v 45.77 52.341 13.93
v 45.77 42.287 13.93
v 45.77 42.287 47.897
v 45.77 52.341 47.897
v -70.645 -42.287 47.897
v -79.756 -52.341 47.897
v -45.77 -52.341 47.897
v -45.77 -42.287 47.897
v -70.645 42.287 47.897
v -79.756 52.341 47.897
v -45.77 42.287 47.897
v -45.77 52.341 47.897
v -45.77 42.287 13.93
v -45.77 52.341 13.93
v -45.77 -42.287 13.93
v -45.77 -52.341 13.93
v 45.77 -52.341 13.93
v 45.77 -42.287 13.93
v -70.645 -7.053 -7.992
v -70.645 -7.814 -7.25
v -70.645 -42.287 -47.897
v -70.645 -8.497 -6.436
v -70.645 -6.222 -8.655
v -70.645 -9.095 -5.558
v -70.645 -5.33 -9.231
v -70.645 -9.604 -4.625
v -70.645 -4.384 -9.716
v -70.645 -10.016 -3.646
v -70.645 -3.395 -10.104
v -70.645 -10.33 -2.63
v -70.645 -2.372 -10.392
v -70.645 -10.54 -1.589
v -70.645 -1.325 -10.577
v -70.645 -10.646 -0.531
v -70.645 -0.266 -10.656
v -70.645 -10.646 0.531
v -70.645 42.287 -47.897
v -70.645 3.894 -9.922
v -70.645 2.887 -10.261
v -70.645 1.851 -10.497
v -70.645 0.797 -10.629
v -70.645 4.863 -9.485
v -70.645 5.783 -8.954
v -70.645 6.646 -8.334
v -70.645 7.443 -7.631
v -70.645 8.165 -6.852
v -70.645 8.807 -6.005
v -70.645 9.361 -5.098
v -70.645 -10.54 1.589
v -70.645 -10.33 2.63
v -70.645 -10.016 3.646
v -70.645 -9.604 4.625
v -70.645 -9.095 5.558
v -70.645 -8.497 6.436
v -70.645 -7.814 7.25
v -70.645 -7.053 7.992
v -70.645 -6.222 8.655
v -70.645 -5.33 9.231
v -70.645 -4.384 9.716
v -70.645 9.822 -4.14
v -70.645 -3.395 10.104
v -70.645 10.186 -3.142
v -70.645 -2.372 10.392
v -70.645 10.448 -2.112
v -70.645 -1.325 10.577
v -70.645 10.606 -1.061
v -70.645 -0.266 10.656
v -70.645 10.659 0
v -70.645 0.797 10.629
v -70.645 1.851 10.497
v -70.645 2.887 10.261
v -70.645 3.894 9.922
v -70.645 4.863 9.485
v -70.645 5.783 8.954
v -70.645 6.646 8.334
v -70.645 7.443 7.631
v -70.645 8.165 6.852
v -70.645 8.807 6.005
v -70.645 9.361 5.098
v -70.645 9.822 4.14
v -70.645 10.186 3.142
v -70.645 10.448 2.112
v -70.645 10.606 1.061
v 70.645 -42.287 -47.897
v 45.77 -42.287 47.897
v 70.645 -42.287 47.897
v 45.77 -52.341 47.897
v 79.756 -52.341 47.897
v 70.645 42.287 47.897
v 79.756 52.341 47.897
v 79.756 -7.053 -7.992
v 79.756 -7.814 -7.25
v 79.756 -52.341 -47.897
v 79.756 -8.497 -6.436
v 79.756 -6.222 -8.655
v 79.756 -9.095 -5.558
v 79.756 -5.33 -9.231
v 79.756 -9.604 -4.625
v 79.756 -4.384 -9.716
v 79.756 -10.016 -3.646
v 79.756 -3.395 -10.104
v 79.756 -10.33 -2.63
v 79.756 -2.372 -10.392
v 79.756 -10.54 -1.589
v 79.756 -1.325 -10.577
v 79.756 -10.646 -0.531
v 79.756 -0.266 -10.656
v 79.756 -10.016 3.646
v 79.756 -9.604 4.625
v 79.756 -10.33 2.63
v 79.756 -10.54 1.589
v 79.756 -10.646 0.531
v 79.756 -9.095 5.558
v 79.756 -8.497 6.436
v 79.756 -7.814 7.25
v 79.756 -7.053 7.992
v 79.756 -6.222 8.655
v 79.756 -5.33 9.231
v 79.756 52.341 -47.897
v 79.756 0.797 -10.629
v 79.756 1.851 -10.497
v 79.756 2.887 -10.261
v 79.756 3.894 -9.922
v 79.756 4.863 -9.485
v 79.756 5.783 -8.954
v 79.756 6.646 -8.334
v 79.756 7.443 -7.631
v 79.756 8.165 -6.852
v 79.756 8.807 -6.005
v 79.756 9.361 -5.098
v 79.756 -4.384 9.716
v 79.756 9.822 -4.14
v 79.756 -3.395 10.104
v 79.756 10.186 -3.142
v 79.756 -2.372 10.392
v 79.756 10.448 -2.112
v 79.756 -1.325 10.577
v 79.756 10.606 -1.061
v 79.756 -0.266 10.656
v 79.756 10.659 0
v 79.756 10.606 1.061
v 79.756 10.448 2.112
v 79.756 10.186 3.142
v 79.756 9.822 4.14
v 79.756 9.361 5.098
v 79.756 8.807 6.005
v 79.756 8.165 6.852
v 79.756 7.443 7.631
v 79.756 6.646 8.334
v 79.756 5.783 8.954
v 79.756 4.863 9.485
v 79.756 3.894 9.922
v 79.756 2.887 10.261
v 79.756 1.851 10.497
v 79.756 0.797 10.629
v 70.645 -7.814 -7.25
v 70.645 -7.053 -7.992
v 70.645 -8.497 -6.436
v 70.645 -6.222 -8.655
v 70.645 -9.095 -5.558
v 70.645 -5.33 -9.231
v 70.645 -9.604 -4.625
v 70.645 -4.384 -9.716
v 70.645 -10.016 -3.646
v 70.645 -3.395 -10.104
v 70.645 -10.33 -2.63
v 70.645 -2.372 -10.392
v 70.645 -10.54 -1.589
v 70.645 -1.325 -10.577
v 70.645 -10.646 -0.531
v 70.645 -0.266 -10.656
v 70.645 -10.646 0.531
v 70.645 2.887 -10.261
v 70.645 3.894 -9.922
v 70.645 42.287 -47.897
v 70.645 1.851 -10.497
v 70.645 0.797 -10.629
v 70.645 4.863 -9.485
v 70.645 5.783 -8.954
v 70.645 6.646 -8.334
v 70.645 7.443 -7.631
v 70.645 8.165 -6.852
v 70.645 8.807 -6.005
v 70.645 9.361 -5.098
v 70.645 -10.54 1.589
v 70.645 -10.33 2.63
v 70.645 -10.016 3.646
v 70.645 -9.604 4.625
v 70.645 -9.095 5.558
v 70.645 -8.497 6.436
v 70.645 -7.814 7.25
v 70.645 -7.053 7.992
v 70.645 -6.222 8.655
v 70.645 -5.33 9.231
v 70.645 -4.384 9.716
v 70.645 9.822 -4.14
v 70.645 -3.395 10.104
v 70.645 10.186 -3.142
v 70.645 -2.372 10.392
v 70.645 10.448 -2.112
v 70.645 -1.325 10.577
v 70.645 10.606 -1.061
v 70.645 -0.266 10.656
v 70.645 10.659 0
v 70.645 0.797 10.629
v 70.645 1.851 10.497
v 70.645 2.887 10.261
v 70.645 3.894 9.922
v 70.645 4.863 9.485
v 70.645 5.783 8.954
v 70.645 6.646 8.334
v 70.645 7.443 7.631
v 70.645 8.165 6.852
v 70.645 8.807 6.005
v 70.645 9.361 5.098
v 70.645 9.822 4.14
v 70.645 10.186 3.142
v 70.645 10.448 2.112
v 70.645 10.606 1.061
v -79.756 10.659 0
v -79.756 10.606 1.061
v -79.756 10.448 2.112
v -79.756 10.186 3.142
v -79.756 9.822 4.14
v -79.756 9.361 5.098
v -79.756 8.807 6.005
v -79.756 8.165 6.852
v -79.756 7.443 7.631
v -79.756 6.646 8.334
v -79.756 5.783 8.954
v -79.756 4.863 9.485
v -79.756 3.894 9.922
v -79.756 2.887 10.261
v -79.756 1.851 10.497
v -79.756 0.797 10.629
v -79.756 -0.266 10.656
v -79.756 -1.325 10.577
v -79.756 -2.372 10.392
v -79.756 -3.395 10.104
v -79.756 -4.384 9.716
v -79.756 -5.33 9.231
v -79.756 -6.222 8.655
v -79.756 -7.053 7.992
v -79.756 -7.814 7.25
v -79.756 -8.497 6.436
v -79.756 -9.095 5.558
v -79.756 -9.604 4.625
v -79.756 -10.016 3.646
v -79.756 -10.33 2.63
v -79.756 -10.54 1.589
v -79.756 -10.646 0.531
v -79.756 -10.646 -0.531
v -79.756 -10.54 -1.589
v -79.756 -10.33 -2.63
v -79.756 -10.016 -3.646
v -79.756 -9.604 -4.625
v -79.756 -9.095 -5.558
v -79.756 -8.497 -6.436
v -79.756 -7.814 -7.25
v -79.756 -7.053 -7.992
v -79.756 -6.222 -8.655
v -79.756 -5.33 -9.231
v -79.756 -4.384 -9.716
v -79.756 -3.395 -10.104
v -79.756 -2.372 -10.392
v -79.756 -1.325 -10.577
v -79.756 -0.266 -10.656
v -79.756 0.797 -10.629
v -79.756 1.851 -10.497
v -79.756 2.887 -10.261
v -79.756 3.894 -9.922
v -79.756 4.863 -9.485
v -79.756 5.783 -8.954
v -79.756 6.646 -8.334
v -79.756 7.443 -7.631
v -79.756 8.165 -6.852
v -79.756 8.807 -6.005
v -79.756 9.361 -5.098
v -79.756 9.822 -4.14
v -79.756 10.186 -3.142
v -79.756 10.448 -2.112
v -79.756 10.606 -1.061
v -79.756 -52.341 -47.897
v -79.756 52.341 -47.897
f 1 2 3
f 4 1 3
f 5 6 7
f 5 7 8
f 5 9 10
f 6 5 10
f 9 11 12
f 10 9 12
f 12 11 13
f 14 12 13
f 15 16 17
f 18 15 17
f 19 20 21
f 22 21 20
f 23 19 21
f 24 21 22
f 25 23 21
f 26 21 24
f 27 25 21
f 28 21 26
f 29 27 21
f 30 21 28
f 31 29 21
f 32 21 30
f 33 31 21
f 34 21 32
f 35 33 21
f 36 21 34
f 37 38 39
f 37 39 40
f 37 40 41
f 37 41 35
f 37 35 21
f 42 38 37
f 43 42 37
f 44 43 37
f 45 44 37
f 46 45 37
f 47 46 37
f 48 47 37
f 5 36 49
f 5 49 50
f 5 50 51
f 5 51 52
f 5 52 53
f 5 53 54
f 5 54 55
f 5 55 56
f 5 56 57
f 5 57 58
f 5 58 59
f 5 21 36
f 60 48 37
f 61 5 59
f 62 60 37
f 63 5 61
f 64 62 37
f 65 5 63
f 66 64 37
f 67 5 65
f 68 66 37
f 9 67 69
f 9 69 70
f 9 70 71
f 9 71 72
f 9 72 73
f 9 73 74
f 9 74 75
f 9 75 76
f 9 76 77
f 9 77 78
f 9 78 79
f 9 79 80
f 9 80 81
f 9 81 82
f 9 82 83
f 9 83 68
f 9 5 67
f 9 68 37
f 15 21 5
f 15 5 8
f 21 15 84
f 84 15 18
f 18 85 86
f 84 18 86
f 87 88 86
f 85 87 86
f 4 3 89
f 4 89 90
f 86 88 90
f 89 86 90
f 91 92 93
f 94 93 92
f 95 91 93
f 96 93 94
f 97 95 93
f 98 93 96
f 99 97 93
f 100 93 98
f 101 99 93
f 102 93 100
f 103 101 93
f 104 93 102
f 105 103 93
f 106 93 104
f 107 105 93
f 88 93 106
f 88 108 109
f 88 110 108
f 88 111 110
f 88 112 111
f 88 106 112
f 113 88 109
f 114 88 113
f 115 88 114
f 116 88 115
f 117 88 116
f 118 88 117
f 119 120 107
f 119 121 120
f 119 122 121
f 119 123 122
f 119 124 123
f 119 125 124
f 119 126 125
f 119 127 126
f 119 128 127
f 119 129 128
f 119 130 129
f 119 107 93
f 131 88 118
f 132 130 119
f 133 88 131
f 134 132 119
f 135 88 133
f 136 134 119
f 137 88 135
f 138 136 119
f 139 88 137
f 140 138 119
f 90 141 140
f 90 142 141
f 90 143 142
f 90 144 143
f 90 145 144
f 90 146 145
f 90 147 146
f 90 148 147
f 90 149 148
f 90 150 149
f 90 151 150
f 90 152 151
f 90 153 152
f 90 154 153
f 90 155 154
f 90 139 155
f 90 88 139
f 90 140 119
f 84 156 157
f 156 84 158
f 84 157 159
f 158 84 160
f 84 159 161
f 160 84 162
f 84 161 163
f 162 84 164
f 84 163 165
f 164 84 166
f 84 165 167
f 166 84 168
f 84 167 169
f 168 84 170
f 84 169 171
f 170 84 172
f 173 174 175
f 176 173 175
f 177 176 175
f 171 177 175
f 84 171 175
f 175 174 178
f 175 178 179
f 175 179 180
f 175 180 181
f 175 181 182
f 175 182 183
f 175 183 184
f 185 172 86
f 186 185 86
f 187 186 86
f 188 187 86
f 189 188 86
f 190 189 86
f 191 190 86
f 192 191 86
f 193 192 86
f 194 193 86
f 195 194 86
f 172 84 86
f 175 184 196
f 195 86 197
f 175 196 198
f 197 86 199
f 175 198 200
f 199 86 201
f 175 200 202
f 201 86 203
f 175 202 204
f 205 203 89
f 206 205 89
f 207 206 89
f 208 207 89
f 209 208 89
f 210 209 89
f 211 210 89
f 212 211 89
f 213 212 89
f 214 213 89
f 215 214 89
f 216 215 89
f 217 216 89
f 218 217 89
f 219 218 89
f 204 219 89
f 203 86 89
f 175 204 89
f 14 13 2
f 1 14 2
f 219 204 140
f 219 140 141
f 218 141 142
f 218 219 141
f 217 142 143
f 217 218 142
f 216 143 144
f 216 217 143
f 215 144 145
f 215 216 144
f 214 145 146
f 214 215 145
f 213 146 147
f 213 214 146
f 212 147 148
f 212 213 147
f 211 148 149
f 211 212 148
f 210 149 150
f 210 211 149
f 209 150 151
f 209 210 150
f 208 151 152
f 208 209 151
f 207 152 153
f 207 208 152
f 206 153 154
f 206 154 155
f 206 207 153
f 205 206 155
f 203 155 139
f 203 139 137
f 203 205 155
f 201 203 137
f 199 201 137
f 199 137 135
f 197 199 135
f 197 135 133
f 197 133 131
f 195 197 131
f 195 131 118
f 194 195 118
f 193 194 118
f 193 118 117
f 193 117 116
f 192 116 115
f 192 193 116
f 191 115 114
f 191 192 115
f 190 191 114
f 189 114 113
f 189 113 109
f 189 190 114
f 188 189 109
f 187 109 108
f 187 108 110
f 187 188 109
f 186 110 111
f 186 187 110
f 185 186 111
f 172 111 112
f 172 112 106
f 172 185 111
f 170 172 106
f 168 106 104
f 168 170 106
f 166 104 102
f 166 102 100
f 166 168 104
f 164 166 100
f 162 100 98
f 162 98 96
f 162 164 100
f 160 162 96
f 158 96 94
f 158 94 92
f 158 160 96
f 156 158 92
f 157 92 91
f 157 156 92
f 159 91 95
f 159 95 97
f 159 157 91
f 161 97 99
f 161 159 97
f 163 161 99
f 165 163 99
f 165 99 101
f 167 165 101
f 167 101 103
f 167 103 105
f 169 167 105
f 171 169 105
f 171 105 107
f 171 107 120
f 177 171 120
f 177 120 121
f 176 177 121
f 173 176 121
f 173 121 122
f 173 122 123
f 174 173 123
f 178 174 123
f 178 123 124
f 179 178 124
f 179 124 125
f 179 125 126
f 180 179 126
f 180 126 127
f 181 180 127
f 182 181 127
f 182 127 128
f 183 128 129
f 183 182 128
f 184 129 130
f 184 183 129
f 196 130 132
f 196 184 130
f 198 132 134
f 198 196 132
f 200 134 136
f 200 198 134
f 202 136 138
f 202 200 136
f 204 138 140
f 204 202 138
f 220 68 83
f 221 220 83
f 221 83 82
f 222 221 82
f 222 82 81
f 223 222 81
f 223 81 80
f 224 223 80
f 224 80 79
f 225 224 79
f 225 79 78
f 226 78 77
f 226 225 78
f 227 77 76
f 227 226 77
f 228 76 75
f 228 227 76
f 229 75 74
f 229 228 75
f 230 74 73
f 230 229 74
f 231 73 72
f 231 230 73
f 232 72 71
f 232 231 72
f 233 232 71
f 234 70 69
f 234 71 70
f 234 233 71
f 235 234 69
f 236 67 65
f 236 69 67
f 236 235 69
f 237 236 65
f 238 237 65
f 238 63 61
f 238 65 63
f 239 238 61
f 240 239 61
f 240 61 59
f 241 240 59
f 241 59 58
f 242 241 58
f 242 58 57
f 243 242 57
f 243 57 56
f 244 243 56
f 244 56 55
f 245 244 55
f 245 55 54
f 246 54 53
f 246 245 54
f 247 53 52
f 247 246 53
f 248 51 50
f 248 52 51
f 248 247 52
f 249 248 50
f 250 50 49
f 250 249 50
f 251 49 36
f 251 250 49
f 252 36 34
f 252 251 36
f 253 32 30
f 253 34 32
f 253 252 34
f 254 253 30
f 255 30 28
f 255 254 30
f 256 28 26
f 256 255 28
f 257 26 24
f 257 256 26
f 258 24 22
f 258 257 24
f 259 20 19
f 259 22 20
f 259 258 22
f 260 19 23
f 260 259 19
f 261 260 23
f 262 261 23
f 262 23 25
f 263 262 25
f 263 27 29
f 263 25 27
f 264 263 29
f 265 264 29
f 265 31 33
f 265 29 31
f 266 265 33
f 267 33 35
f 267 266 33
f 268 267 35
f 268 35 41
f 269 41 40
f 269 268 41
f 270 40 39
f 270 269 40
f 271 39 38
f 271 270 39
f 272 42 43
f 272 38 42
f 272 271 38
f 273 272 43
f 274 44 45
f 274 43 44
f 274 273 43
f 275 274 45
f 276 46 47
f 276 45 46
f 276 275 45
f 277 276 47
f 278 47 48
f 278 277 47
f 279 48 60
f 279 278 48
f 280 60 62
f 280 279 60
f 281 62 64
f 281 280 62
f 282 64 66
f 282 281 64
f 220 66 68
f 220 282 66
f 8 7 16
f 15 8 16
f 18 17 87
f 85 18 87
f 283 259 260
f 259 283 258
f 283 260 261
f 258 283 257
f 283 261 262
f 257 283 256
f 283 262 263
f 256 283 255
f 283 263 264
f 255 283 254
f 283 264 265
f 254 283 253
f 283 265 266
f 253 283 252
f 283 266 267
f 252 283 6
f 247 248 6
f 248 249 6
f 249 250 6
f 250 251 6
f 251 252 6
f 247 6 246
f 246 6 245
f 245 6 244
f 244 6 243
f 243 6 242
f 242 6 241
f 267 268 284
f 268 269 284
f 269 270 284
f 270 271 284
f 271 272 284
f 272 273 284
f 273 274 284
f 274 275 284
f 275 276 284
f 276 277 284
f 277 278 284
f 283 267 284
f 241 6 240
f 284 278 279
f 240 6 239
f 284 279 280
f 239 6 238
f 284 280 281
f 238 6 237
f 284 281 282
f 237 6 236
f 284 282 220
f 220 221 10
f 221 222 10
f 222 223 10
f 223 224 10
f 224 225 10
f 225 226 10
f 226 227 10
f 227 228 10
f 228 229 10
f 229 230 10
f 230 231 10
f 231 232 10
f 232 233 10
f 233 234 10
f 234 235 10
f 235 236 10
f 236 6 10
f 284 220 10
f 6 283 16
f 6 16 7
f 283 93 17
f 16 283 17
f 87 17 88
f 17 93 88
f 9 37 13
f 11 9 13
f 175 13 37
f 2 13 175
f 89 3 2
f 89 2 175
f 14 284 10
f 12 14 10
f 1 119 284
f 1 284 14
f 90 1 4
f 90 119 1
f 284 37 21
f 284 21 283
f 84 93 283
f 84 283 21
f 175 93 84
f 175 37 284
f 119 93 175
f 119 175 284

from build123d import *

# Parameters (mm, degrees)
F0_W     = 104.681172
F0_H     = 95.793142
F0_R     = 10.65923
F1_DEPTH = 79.756
F2_W     = 141.289428
F2_H     = 84.574654
F3_DEPTH = 119.126
F5_DEPTH = 183.642


with BuildPart() as f1:
    # F0 (on Right) → F1 (new body, symmetric)
    with BuildSketch(Plane.YZ):
        Rectangle(F0_W, F0_H)
        Circle(F0_R, mode=Mode.SUBTRACT)
    extrude(amount=F1_DEPTH, both=True)

    # F2 (on face) → F3 (cut)
    with BuildSketch(Plane.XY.offset(47.896571)):
        Rectangle(F2_W, F2_H)
    extrude(amount=-F3_DEPTH, mode=Mode.SUBTRACT)

    # F4 (on face) → F5 (cut)
    with BuildSketch(Plane.XZ.offset(52.340586)):
        Polygon((45.769807, 47.896571), (0, 47.896571), (-45.769807, 47.896571), (-45.769807, 13.929941), (0, 13.929941), (45.769807, 13.929941), align=None)
    extrude(amount=-F5_DEPTH, mode=Mode.SUBTRACT)


solid = f1.part
